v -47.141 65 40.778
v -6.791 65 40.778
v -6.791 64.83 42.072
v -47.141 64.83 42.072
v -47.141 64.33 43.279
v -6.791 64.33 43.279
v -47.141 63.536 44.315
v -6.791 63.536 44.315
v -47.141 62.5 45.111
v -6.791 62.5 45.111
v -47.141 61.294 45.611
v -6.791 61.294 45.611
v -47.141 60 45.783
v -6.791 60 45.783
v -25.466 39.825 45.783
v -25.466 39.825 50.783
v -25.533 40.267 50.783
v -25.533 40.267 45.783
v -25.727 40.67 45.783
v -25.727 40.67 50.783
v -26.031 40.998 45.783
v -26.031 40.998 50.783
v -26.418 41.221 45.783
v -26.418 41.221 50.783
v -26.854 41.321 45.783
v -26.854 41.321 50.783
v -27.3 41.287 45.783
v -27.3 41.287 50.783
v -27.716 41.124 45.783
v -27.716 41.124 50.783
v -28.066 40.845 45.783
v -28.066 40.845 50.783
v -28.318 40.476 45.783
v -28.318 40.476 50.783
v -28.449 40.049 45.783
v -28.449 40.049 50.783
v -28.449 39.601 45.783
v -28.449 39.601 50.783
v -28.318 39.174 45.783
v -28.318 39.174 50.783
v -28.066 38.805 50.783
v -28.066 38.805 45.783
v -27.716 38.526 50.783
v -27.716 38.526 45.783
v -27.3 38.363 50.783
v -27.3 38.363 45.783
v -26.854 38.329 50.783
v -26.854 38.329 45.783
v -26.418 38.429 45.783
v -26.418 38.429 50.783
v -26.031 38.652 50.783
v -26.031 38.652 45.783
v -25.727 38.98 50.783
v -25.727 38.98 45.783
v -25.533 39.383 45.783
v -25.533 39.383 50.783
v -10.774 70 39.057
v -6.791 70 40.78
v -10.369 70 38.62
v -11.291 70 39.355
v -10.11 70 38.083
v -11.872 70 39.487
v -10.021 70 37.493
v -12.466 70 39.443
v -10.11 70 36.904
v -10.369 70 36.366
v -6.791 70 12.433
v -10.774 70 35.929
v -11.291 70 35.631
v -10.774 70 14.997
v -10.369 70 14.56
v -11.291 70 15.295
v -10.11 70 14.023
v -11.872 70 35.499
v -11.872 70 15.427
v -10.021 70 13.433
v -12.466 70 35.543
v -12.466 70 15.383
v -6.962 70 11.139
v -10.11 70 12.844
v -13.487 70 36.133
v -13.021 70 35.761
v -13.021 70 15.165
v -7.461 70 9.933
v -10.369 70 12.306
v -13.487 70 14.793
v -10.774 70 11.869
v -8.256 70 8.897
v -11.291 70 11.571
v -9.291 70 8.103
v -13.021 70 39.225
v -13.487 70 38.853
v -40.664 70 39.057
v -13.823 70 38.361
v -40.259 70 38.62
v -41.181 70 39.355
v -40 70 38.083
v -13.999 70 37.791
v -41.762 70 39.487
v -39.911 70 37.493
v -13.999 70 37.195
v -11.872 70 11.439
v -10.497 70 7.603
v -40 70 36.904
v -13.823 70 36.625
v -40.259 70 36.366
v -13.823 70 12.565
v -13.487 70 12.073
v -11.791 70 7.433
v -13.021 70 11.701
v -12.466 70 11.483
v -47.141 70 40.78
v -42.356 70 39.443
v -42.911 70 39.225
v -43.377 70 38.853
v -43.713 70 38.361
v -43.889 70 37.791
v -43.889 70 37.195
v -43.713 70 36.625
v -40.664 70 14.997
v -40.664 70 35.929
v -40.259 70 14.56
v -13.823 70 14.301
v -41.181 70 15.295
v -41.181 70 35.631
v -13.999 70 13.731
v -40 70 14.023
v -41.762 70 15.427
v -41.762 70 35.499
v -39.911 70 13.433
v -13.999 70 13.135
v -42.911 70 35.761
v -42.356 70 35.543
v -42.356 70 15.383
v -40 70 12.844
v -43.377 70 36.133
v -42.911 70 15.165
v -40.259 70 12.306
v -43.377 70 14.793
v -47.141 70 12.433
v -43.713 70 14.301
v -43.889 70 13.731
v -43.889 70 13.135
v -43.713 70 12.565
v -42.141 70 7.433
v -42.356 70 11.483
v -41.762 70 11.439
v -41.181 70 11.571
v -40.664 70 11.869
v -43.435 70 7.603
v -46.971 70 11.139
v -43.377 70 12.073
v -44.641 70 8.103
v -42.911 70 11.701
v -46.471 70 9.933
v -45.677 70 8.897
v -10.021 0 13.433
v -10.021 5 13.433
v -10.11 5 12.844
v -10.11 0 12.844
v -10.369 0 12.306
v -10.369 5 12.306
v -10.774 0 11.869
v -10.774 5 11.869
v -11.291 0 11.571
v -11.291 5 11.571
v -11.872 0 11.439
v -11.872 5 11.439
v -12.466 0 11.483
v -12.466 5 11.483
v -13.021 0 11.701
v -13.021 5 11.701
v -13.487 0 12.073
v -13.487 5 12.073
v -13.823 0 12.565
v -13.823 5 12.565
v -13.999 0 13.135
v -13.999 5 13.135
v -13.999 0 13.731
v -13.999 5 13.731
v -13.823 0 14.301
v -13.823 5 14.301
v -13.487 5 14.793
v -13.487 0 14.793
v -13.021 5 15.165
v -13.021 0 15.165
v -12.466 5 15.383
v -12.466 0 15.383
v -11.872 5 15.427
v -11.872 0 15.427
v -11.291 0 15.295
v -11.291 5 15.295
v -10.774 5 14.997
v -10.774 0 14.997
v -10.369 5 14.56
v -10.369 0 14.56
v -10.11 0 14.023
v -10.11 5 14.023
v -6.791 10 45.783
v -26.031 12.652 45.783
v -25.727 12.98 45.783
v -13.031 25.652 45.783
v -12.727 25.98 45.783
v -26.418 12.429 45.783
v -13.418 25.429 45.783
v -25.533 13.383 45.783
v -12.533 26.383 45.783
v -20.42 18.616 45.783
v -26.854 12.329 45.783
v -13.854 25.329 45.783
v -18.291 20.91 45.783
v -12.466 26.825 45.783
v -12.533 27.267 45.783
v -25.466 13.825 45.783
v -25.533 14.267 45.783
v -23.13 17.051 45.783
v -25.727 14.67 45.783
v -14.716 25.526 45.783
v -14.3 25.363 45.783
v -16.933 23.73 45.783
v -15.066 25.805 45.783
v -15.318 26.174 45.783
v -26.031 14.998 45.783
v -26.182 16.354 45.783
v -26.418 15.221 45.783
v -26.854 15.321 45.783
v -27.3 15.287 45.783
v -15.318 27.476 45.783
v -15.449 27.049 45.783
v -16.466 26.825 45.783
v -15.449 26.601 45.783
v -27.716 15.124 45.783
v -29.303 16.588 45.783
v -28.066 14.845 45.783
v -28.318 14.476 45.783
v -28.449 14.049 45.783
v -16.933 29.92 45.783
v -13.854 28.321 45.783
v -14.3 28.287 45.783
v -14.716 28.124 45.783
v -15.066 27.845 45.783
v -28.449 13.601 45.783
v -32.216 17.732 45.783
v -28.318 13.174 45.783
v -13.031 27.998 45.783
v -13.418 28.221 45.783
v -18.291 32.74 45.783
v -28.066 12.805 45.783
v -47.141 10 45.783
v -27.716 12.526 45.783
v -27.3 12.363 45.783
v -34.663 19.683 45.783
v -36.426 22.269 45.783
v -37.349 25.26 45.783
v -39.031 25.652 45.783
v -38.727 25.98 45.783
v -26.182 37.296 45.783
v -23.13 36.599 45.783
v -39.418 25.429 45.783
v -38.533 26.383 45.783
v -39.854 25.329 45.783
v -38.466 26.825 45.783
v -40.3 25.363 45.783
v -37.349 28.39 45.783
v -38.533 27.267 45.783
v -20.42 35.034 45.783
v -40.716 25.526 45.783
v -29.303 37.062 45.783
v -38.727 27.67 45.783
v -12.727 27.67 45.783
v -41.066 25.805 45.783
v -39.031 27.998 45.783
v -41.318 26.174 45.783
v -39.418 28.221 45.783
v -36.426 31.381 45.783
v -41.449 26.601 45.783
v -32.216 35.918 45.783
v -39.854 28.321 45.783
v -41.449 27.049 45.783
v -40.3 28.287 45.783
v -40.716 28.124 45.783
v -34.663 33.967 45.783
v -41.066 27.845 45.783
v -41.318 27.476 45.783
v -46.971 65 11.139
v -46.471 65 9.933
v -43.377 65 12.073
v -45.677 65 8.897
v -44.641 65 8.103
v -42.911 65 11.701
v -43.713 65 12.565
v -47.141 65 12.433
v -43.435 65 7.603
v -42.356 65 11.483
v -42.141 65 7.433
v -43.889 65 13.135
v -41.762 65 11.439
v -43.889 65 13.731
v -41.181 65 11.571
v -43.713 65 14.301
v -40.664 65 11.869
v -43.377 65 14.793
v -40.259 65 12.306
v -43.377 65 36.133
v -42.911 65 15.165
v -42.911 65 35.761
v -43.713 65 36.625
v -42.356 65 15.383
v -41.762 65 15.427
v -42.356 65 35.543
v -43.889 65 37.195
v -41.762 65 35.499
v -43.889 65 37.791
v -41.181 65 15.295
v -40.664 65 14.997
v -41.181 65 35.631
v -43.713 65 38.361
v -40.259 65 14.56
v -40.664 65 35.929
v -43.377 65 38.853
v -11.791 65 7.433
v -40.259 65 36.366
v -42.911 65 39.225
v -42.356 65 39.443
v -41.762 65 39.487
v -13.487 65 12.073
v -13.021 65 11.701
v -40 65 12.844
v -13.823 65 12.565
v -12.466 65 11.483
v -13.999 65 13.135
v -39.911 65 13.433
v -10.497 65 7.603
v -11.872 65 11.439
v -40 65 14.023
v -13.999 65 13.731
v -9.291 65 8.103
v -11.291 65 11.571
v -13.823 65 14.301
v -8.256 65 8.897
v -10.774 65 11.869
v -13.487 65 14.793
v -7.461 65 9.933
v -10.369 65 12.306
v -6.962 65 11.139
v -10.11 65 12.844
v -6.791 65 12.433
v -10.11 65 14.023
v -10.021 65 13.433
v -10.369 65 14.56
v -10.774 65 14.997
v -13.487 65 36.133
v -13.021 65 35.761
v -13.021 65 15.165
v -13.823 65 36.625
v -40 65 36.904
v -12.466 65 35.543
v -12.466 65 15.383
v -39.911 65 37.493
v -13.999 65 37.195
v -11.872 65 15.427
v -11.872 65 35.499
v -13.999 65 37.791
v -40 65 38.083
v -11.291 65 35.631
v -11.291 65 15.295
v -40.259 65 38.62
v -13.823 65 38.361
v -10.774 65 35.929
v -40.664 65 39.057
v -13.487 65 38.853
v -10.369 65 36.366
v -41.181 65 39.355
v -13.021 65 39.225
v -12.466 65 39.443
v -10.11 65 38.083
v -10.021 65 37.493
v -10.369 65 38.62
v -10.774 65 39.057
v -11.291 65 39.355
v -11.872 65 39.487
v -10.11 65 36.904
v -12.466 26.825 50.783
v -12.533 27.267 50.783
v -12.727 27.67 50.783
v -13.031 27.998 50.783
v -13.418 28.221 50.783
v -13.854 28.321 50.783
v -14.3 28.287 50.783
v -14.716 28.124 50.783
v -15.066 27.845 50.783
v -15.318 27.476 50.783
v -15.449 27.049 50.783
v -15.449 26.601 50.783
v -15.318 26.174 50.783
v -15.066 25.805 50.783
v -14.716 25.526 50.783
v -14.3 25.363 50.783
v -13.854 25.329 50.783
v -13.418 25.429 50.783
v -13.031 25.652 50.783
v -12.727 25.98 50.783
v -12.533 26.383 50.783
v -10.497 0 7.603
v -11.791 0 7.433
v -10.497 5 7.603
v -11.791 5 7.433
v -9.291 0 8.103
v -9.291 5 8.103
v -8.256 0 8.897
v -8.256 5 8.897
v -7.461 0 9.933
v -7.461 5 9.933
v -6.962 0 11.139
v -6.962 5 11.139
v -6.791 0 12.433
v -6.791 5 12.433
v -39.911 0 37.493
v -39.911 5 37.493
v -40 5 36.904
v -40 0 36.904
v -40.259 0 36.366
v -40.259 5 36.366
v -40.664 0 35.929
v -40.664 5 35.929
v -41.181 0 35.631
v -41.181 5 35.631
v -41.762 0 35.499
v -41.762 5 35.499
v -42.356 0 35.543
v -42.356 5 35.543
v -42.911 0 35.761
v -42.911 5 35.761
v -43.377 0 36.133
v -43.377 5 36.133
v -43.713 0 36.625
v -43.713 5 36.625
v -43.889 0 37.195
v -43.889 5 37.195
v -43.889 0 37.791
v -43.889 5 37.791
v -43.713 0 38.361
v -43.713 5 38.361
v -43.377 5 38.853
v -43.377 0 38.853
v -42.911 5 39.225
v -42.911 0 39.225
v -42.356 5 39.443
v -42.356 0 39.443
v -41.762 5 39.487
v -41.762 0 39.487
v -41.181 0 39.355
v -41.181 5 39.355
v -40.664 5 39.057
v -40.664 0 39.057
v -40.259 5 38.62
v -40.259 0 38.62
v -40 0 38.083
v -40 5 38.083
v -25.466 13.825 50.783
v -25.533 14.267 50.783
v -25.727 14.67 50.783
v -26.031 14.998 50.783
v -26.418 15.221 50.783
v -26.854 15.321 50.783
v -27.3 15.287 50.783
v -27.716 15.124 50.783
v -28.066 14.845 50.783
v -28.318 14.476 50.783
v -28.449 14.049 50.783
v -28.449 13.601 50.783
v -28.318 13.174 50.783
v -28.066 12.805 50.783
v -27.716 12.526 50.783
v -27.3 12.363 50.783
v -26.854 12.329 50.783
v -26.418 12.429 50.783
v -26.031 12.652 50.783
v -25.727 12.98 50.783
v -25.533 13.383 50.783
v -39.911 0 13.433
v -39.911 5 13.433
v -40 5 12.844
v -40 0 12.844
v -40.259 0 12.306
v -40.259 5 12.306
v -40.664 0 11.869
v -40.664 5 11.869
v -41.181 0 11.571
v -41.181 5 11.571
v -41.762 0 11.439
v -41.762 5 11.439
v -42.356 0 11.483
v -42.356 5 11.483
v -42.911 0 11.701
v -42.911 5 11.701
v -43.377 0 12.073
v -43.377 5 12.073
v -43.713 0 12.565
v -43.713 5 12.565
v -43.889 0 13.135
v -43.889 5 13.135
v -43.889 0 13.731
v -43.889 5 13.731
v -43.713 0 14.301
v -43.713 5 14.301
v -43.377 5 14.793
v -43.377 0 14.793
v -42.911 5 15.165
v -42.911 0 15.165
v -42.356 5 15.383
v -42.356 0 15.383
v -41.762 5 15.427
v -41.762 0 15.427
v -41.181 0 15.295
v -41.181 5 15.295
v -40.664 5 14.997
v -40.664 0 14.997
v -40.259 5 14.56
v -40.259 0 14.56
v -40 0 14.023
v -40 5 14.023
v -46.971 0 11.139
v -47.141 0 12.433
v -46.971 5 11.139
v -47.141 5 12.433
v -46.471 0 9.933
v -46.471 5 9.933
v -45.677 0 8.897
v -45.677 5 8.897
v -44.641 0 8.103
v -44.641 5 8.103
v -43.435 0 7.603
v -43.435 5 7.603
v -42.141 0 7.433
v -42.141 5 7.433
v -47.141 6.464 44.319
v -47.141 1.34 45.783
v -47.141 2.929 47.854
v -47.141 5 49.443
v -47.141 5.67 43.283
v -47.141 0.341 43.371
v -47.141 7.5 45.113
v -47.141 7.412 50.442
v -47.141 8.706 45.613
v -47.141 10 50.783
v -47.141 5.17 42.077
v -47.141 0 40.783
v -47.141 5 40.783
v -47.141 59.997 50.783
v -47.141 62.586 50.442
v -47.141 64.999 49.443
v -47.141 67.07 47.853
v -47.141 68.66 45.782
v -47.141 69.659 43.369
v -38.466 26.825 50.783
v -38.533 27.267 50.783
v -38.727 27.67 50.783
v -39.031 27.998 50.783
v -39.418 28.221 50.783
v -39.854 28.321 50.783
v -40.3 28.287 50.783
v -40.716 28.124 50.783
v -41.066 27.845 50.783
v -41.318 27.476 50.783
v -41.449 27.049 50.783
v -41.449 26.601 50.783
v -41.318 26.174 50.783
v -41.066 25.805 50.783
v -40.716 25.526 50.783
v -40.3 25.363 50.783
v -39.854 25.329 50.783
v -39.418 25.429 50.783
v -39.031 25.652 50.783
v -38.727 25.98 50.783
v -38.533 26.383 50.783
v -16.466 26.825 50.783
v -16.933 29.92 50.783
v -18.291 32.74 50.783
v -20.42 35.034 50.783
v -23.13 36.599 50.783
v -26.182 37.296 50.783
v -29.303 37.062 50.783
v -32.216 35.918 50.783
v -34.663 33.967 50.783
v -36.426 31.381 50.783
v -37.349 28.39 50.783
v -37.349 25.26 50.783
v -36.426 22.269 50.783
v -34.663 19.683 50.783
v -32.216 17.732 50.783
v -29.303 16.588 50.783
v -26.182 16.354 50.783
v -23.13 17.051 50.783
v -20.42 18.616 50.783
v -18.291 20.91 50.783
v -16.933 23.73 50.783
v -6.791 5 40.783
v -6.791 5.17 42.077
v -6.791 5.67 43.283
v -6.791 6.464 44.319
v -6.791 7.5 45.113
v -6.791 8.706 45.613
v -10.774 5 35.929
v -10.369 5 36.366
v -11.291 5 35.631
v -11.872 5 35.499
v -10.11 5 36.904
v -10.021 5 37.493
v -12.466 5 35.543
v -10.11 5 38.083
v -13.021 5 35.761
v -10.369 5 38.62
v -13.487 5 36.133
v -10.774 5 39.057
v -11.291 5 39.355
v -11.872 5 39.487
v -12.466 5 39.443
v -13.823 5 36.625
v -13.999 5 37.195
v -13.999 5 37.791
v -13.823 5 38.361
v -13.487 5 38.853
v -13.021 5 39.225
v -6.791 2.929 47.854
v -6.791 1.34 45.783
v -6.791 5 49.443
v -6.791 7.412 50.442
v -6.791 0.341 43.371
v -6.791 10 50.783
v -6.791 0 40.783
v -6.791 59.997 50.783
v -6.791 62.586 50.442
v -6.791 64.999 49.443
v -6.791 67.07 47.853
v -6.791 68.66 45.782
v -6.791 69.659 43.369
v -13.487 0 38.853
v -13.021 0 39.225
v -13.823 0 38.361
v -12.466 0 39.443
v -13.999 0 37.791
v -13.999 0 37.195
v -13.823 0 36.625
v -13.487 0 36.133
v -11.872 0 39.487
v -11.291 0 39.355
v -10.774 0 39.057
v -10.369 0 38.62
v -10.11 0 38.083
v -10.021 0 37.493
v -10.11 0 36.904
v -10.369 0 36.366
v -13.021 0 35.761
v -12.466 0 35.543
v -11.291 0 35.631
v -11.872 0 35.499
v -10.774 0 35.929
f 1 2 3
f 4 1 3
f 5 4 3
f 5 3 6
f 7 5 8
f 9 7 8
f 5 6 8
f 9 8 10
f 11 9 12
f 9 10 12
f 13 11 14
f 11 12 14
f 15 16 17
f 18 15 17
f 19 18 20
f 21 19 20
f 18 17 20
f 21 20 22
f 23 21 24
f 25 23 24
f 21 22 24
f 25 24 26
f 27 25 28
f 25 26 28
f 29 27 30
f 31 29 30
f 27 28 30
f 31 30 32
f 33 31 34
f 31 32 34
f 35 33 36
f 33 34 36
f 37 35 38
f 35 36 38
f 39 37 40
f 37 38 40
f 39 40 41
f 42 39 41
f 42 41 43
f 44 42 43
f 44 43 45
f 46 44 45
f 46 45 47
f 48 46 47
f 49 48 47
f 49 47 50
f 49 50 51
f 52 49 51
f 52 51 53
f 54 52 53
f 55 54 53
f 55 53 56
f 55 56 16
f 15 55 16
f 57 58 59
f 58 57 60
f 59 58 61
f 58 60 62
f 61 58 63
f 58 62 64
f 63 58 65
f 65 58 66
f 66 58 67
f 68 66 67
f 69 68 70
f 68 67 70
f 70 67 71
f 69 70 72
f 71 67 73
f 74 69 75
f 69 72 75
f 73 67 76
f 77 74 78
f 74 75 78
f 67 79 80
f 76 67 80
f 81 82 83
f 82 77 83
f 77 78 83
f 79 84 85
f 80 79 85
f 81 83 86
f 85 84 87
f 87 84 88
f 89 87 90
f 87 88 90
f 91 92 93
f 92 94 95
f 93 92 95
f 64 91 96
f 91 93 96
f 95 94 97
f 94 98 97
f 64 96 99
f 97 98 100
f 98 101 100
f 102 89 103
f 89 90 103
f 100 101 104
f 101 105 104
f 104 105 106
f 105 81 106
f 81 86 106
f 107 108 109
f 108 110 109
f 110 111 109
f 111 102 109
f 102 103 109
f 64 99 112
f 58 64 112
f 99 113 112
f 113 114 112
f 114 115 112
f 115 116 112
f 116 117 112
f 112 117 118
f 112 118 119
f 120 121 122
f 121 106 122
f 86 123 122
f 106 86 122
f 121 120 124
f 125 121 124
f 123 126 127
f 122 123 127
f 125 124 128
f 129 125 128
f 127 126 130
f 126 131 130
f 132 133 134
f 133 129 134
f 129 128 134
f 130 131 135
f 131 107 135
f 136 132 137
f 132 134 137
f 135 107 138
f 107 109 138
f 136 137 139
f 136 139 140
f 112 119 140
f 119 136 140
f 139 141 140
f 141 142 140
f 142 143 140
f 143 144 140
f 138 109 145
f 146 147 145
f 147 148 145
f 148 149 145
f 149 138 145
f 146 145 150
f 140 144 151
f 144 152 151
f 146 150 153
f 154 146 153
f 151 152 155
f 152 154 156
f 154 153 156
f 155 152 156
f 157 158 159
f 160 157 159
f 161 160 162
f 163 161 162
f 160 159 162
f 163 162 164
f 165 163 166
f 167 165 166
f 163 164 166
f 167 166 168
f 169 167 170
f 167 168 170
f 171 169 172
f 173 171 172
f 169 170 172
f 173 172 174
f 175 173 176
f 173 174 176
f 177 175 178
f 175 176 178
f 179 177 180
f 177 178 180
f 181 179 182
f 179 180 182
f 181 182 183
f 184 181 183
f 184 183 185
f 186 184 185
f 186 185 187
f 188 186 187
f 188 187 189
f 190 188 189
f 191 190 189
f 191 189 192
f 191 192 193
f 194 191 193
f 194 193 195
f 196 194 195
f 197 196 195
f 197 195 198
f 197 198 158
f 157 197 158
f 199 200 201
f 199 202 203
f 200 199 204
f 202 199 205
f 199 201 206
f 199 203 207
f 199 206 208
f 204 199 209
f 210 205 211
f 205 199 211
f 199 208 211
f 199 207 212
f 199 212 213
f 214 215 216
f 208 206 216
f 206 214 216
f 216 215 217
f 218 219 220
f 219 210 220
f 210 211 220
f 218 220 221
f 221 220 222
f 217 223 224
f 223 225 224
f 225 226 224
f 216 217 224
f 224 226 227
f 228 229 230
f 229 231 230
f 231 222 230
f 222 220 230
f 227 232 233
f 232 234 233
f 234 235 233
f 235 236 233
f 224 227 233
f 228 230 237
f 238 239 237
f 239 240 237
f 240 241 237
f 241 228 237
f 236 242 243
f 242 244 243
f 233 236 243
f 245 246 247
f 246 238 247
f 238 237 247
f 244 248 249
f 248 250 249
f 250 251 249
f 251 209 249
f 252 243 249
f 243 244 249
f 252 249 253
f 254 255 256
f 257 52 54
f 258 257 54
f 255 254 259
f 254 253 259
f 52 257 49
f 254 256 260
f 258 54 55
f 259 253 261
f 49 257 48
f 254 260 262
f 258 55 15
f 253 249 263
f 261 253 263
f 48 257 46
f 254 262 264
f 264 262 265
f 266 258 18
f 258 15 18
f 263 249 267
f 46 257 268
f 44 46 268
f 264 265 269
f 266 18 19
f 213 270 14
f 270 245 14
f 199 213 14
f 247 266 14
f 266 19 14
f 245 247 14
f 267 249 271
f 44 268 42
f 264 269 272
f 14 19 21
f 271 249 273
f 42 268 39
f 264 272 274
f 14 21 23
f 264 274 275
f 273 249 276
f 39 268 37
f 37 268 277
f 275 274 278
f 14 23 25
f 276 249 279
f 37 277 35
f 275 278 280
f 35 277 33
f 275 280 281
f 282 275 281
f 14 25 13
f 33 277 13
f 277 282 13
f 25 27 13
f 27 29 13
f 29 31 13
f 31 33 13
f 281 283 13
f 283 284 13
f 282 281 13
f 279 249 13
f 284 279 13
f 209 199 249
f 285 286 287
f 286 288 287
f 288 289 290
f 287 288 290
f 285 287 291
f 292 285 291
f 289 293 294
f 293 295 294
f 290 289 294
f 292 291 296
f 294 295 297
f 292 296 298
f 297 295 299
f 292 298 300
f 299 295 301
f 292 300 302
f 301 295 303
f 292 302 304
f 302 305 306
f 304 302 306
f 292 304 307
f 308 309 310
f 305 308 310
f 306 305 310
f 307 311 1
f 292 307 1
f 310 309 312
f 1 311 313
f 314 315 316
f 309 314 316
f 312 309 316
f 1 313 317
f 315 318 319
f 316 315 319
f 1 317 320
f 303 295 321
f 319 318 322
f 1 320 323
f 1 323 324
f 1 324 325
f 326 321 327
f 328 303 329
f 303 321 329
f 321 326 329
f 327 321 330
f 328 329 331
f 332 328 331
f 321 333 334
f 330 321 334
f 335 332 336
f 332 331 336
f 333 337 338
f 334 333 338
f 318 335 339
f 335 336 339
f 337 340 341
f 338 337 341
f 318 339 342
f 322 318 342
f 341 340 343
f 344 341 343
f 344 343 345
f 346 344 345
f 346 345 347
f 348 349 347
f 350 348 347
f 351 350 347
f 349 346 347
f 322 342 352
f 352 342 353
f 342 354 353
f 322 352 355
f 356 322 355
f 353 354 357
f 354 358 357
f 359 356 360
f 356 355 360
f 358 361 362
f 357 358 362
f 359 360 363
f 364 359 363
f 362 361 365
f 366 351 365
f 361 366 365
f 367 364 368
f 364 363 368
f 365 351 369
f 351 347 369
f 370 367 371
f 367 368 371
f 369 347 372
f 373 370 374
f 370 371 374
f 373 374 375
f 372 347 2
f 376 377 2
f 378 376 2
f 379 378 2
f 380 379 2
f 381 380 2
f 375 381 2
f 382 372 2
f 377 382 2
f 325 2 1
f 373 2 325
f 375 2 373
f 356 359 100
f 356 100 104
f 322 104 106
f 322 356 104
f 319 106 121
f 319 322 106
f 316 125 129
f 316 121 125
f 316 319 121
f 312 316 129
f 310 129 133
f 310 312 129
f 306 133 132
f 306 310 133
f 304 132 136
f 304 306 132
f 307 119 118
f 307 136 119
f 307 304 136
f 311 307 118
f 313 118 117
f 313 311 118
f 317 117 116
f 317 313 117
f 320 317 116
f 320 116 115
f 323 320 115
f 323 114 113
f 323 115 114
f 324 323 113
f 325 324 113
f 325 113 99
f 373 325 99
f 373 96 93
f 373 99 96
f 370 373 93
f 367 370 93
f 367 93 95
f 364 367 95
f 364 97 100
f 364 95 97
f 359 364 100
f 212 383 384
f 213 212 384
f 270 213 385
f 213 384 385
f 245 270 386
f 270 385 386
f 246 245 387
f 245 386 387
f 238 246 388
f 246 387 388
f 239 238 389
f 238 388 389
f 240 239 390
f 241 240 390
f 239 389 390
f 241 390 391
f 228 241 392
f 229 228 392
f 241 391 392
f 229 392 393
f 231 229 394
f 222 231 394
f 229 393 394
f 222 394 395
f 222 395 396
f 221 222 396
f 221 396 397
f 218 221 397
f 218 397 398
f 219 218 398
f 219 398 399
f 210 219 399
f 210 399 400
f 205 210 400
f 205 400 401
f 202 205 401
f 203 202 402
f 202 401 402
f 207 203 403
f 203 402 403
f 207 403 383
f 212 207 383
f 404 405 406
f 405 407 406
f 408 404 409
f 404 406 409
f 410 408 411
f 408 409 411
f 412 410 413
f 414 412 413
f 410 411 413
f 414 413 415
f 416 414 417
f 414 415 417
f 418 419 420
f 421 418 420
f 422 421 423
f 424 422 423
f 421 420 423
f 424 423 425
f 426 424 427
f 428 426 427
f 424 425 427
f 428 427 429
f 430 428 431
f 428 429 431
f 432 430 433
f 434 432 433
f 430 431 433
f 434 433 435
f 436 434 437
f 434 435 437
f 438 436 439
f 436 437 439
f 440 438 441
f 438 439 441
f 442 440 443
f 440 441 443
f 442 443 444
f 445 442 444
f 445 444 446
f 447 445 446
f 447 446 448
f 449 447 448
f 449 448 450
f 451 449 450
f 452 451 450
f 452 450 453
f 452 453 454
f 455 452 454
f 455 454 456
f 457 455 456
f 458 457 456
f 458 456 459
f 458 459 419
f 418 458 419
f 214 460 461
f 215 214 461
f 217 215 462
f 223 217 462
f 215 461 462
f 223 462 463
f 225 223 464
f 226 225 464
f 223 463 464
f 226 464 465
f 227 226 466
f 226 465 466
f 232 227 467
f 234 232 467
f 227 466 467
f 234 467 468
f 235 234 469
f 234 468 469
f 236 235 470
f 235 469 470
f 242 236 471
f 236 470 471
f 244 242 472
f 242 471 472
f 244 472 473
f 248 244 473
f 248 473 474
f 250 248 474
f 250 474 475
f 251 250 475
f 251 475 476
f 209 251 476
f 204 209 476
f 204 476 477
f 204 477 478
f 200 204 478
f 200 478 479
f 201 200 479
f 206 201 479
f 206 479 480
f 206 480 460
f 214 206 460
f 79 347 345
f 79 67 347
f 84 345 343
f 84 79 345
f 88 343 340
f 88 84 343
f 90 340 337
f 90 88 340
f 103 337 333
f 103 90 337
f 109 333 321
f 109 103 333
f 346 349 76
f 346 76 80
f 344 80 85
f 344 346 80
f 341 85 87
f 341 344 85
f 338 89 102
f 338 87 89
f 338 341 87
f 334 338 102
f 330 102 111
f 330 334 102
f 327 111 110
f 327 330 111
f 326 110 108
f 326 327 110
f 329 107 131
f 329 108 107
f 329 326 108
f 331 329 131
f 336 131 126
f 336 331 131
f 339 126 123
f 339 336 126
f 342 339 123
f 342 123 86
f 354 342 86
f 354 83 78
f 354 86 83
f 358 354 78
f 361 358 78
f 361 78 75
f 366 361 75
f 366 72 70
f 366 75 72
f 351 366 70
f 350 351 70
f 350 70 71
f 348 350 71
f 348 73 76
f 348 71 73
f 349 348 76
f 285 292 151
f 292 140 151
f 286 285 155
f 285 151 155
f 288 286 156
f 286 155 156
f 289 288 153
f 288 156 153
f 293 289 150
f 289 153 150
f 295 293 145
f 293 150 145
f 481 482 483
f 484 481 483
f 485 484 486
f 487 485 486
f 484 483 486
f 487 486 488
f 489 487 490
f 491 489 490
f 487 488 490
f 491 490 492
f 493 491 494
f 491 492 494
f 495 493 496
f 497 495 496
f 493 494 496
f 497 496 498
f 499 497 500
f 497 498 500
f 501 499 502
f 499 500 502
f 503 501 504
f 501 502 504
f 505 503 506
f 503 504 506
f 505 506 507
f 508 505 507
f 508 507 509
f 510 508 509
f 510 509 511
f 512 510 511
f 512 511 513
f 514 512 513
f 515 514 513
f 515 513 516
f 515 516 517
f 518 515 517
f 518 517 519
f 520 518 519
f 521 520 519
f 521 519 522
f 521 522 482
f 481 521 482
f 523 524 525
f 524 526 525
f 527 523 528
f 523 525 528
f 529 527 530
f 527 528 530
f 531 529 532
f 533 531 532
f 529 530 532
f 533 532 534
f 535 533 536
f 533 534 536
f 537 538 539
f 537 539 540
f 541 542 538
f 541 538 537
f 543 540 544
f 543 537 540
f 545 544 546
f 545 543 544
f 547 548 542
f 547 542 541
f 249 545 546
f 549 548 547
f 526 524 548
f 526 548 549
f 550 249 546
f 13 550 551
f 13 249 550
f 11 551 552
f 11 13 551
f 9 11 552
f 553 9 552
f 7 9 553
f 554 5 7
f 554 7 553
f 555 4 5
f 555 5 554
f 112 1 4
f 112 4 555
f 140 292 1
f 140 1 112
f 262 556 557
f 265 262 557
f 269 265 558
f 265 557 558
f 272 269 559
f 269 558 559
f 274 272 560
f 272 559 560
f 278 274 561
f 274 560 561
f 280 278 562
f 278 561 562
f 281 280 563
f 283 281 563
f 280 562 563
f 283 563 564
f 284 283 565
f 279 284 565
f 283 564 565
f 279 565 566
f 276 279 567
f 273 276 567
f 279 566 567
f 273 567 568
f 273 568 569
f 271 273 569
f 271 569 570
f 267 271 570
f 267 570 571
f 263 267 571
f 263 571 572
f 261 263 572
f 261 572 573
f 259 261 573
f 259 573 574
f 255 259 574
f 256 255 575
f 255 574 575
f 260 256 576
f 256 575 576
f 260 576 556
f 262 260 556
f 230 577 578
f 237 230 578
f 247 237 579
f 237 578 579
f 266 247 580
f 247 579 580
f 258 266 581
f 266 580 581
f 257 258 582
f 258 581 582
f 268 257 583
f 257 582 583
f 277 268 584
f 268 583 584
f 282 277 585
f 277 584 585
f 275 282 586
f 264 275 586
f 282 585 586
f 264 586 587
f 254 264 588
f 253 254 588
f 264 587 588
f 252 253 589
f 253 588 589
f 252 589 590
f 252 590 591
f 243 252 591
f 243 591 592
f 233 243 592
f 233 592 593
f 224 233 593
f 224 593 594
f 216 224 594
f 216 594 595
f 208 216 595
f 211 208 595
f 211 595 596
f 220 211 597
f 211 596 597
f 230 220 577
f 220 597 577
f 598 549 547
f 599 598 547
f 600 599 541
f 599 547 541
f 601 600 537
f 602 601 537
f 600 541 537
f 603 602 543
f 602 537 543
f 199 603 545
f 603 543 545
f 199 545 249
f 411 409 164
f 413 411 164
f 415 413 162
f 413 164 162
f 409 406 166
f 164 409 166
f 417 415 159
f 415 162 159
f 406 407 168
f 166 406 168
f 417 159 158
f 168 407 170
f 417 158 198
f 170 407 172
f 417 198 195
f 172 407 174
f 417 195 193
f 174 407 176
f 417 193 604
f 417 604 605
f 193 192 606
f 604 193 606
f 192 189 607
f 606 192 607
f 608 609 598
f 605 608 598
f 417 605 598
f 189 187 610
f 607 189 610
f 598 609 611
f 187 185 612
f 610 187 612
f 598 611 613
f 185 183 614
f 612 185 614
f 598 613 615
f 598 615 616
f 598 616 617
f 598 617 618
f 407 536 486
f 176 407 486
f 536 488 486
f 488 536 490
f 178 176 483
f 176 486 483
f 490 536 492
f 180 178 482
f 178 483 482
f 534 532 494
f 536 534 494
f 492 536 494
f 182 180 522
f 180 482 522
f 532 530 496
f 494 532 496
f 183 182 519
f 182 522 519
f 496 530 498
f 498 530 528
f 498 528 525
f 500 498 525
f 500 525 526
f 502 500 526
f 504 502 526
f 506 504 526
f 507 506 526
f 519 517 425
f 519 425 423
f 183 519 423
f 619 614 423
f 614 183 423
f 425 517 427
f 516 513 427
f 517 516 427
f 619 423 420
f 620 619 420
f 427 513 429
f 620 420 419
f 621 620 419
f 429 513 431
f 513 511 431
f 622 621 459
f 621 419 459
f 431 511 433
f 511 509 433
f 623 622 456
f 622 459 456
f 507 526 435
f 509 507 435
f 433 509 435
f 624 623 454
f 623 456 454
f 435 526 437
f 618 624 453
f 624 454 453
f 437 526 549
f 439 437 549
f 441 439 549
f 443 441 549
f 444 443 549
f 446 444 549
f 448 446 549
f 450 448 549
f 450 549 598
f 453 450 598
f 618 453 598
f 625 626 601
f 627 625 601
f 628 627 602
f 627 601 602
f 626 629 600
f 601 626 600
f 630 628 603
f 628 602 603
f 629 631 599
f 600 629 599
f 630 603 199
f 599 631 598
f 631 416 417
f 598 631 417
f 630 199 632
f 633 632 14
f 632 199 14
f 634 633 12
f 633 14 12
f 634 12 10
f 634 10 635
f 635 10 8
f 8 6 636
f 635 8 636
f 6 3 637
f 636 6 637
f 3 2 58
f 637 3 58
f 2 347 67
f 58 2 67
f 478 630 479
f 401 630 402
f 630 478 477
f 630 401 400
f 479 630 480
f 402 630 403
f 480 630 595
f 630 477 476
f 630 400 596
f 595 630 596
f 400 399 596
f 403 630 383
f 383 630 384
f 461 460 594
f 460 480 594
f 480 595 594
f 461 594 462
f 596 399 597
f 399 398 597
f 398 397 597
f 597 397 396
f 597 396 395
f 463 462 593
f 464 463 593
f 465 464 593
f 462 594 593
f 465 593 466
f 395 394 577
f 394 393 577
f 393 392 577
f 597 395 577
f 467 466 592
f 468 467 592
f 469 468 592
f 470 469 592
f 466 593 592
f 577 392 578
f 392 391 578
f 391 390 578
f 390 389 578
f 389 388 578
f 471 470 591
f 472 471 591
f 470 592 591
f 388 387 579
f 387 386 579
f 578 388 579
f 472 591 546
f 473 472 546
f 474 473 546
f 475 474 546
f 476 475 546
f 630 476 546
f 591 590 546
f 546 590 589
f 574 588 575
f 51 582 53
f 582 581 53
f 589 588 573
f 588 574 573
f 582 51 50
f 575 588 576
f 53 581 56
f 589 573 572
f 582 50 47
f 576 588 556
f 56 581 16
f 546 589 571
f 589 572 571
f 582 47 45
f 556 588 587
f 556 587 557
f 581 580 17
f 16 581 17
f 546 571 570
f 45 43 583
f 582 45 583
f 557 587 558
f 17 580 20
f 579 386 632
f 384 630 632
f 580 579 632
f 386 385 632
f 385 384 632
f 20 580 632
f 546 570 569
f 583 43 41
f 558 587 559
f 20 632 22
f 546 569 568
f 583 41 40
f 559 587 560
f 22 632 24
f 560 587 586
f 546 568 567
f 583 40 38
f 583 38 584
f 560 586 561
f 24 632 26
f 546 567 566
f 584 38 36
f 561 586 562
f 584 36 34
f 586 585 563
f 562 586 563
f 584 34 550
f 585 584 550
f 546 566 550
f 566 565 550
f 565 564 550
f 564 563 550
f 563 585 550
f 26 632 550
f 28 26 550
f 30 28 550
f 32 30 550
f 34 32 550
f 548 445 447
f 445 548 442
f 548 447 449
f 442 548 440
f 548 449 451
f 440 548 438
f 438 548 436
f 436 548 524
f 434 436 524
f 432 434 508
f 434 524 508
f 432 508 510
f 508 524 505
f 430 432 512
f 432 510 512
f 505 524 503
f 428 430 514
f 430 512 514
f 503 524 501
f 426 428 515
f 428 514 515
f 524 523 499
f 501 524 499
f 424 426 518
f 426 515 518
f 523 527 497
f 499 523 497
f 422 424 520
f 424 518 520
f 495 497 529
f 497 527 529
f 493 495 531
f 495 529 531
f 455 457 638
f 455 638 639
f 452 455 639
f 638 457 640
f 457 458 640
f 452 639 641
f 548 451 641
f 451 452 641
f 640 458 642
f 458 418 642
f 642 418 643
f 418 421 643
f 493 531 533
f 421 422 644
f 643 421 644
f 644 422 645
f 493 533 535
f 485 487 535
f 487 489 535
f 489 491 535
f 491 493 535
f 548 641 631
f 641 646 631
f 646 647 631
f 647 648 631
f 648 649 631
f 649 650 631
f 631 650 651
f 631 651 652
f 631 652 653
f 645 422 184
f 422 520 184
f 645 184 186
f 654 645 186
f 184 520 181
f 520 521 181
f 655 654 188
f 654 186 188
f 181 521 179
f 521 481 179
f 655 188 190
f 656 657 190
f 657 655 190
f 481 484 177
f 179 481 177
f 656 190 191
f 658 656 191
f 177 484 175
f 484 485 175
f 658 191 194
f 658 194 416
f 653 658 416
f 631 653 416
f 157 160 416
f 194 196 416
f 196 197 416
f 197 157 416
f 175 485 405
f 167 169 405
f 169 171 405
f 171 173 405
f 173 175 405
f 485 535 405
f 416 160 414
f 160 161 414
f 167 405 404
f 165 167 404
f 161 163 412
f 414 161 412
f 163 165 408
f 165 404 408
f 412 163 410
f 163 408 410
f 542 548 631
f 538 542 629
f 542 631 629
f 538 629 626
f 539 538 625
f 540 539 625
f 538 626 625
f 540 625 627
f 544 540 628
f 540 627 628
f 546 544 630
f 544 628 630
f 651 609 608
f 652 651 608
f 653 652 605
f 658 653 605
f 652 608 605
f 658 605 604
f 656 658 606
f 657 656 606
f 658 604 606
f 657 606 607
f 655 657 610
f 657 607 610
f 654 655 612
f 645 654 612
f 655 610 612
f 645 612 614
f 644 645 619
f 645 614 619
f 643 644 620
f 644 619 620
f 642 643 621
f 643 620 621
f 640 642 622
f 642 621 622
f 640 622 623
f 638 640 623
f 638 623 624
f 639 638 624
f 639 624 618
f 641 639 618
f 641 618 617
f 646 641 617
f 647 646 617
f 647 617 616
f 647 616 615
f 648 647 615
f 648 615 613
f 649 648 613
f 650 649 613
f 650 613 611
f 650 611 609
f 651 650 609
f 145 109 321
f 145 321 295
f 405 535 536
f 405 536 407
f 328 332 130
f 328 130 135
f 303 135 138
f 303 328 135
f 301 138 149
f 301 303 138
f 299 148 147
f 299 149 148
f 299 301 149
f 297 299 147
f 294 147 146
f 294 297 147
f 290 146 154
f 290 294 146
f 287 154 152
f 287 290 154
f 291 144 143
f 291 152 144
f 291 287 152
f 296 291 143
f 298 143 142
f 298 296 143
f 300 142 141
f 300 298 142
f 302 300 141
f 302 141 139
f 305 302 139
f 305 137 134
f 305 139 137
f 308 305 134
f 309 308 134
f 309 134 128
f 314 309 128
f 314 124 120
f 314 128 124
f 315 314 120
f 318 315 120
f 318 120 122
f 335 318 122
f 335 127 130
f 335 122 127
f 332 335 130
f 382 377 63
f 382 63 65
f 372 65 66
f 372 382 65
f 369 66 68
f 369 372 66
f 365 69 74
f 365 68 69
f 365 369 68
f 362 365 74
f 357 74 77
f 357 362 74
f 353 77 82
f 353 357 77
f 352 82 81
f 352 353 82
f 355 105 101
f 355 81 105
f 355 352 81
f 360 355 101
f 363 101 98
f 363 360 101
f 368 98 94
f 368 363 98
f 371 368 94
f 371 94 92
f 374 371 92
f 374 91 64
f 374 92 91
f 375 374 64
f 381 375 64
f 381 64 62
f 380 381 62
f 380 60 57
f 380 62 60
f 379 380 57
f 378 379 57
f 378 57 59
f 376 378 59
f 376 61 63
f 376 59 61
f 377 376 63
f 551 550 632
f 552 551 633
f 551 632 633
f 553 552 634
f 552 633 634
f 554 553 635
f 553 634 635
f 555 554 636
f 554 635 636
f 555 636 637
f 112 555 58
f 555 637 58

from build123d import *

# Parameters (mm, degrees)
SKETCH1_W                = 40.35
SKETCH1_H                = 43.35
BOSS_EXTRUDE1_DEPTH      = 47
CUT_EXTRUDE2_DEPTH       = 102
FILLET1_R                = 10
CUT_EXTRUDE3_DEPTH       = 102
FILLET2_R                = 5
SKETCH7_R                = 10.5
SKETCH7_R_2              = 1.5
CUT_EXTRUDE5_DEPTH       = 10
SKETCH8_W                = 40.35
SKETCH8_H                = 43.175
BOSS_EXTRUDE2_DEPTH      = 38.35
BOSS_EXTRUDE2_DEPTH_BACK = 5
SKETCH6_R                = 2
CUT_EXTRUDE4_DEPTH       = 102
CUT_EXTRUDE4_DEPTH_BACK  = 102
CUT_EXTRUDE6_DEPTH       = 50
FILLET3_R                = 5
SKETCH10_R               = 10.5
SKETCH10_R_2             = 1.5
CUT_EXTRUDE7_DEPTH       = 50


with BuildPart() as part:
    # Sketch1 → Boss-Extrude1 (new body)
    with BuildSketch(Plane(origin=(0, 0, 0), x_dir=(1, 0, 0), z_dir=(0, 1, 0))):
        with Locations((-26.966212793, -29.108023223)):
            Rectangle(SKETCH1_W, SKETCH1_H)
    extrude(amount=BOSS_EXTRUDE1_DEPTH)

    # Sketch3 → Cut-Extrude2 (cut)
    with BuildSketch(Plane.XY.offset(50.783023223)):
        with BuildLine():
            Line((-47.141212793, 47), (-47.141212793, 26.825))
            ThreePointArc((-47.141212793, 26.825), (-41.232092103, 41.09087931), (-26.966212793, 47))
            Line((-26.966212793, 47), (-47.141212793, 47))
        make_face()
        with BuildLine():
            Line((-6.791212793, 47), (-26.966212793, 47))
            ThreePointArc((-26.966212793, 47), (-12.700333482, 41.09087931), (-6.791212793, 26.825))
            Line((-6.791212793, 26.825), (-6.791212793, 47))
        make_face()
    extrude(amount=-CUT_EXTRUDE2_DEPTH, mode=Mode.SUBTRACT)

    # Fillet1
    fillet1_edges = [part.edges().sort_by_distance(p)[0] for p in [
        (-26.966212793, 0, 50.783023223),
    ]]
    fillet(fillet1_edges, radius=FILLET1_R)

    # Sketch5 → Cut-Extrude3 (cut)
    with BuildSketch(Plane.ZY.offset(47.141212793)):
        with BuildLine():
            Line((-6.665763497, 5), (36.595559978, 5))
            Line((36.595559978, 5), (40.783023223, 5))
            ThreePointArc((40.783023223, 5), (44.318557129, 6.464466094), (45.783023223, 10))
            Line((45.783023223, 10), (45.783023223, 17.578484004))
            Line((45.783023223, 17.578484004), (45.783023223, 59.778436909))
            Line((45.783023223, 59.778436909), (-6.665763497, 59.778436909))
            Line((-6.665763497, 59.778436909), (-6.665763497, 5))
        make_face()
    extrude(amount=-CUT_EXTRUDE3_DEPTH, mode=Mode.SUBTRACT)

    # Fillet2
    fillet2_edges = [part.edges().sort_by_distance(p)[0] for p in [
        (-6.791212793, 2.5, 7.433023223),
        (-47.141212793, 2.5, 7.433023223),
    ]]
    fillet(fillet2_edges, radius=FILLET2_R)

    # Sketch7 → Cut-Extrude5 (cut)
    with BuildSketch(Plane.XY.offset(50.783023223)):
        with Locations((-26.966212793, 26.825)):
            Circle(SKETCH7_R)
        with Locations((-26.966212793, 39.825)):
            Circle(SKETCH7_R_2)
        with Locations((-13.966212793, 26.825)):
            Circle(SKETCH7_R_2)
        with Locations((-26.966212793, 13.825)):
            Circle(SKETCH7_R_2)
        with Locations((-39.966212793, 26.825)):
            Circle(SKETCH7_R_2)
    extrude(amount=-CUT_EXTRUDE5_DEPTH, mode=Mode.SUBTRACT)

    # Sketch8 → Boss-Extrude2 (add, two sides)
    with BuildSketch(Plane(origin=(0, 0, 45.783023223), x_dir=(-1, 0, 0), z_dir=(0, 0, -1))) as boss_extrude2_sk:
        with Locations((26.966212793, 48.4125)):
            Rectangle(SKETCH8_W, SKETCH8_H)
    extrude(amount=BOSS_EXTRUDE2_DEPTH)
    extrude(boss_extrude2_sk.sketch, amount=-BOSS_EXTRUDE2_DEPTH_BACK)

    # Sketch6 → Cut-Extrude4 (cut, two sides)
    with BuildSketch(Plane(origin=(0, 5, 0), x_dir=(1, 0, 0), z_dir=(0, 1, 0))) as cut_extrude4_sk:
        with Locations((-41.911212793, -13.433023223)):
            Circle(SKETCH6_R)
        with Locations((-12.021212793, -13.433023223)):
            Circle(SKETCH6_R)
        with Locations((-41.911212793, -37.493023223)):
            Circle(SKETCH6_R)
        with Locations((-12.021212793, -37.493023223)):
            Circle(SKETCH6_R)
    extrude(amount=CUT_EXTRUDE4_DEPTH, mode=Mode.SUBTRACT)
    extrude(cut_extrude4_sk.sketch, amount=-CUT_EXTRUDE4_DEPTH_BACK, mode=Mode.SUBTRACT)

    # Sketch9 → Cut-Extrude6 (cut)
    with BuildSketch(Plane(origin=(-6.791212793, 0, 0), x_dir=(0, 0, -1), z_dir=(1, 0, 0))):
        with BuildLine():
            Line((-7.433023223, 26.825), (-7.433023223, 65.000002288))
            Line((-7.433023223, 65.000002288), (-40.777808898, 65.000002288))
            ThreePointArc((-40.777808898, 65.000002288), (-44.31533911, 63.535699871), (-45.783023223, 59.99957135))
            Line((-45.783023223, 59.99957135), (-45.783023223, 26.825))
            Line((-45.783023223, 26.825), (-7.433023223, 26.825))
        make_face()
        with BuildLine():
            ThreePointArc((-50.783023223, 59.997178226), (-47.853264556, 67.070241334), (-40.780201449, 70))
            Line((-40.780201449, 70), (-50.783023223, 70))
            Line((-50.783023223, 70), (-50.783023223, 59.997178226))
        make_face()
    extrude(amount=-CUT_EXTRUDE6_DEPTH, mode=Mode.SUBTRACT)

    # Fillet3
    fillet3_edges = [part.edges().sort_by_distance(p)[0] for p in [
        (-47.141212793, 67.500001144, 7.433023223),
        (-6.791212793, 67.500001144, 7.433023223),
    ]]
    fillet(fillet3_edges, radius=FILLET3_R)

    # Sketch10 → Cut-Extrude7 (cut)
    with BuildSketch(Plane.XY.offset(50.783023223)):
        with Locations((-26.966212793, 26.825)):
            Circle(SKETCH10_R)
        with Locations((-13.966212793, 26.825)):
            Circle(SKETCH10_R_2)
        with Locations((-26.966212793, 13.825)):
            Circle(SKETCH10_R_2)
        with Locations((-39.966212793, 26.825)):
            Circle(SKETCH10_R_2)
        with Locations((-26.966212793, 39.825)):
            Circle(SKETCH10_R_2)
    extrude(amount=-CUT_EXTRUDE7_DEPTH, mode=Mode.SUBTRACT)


solid = part.part
